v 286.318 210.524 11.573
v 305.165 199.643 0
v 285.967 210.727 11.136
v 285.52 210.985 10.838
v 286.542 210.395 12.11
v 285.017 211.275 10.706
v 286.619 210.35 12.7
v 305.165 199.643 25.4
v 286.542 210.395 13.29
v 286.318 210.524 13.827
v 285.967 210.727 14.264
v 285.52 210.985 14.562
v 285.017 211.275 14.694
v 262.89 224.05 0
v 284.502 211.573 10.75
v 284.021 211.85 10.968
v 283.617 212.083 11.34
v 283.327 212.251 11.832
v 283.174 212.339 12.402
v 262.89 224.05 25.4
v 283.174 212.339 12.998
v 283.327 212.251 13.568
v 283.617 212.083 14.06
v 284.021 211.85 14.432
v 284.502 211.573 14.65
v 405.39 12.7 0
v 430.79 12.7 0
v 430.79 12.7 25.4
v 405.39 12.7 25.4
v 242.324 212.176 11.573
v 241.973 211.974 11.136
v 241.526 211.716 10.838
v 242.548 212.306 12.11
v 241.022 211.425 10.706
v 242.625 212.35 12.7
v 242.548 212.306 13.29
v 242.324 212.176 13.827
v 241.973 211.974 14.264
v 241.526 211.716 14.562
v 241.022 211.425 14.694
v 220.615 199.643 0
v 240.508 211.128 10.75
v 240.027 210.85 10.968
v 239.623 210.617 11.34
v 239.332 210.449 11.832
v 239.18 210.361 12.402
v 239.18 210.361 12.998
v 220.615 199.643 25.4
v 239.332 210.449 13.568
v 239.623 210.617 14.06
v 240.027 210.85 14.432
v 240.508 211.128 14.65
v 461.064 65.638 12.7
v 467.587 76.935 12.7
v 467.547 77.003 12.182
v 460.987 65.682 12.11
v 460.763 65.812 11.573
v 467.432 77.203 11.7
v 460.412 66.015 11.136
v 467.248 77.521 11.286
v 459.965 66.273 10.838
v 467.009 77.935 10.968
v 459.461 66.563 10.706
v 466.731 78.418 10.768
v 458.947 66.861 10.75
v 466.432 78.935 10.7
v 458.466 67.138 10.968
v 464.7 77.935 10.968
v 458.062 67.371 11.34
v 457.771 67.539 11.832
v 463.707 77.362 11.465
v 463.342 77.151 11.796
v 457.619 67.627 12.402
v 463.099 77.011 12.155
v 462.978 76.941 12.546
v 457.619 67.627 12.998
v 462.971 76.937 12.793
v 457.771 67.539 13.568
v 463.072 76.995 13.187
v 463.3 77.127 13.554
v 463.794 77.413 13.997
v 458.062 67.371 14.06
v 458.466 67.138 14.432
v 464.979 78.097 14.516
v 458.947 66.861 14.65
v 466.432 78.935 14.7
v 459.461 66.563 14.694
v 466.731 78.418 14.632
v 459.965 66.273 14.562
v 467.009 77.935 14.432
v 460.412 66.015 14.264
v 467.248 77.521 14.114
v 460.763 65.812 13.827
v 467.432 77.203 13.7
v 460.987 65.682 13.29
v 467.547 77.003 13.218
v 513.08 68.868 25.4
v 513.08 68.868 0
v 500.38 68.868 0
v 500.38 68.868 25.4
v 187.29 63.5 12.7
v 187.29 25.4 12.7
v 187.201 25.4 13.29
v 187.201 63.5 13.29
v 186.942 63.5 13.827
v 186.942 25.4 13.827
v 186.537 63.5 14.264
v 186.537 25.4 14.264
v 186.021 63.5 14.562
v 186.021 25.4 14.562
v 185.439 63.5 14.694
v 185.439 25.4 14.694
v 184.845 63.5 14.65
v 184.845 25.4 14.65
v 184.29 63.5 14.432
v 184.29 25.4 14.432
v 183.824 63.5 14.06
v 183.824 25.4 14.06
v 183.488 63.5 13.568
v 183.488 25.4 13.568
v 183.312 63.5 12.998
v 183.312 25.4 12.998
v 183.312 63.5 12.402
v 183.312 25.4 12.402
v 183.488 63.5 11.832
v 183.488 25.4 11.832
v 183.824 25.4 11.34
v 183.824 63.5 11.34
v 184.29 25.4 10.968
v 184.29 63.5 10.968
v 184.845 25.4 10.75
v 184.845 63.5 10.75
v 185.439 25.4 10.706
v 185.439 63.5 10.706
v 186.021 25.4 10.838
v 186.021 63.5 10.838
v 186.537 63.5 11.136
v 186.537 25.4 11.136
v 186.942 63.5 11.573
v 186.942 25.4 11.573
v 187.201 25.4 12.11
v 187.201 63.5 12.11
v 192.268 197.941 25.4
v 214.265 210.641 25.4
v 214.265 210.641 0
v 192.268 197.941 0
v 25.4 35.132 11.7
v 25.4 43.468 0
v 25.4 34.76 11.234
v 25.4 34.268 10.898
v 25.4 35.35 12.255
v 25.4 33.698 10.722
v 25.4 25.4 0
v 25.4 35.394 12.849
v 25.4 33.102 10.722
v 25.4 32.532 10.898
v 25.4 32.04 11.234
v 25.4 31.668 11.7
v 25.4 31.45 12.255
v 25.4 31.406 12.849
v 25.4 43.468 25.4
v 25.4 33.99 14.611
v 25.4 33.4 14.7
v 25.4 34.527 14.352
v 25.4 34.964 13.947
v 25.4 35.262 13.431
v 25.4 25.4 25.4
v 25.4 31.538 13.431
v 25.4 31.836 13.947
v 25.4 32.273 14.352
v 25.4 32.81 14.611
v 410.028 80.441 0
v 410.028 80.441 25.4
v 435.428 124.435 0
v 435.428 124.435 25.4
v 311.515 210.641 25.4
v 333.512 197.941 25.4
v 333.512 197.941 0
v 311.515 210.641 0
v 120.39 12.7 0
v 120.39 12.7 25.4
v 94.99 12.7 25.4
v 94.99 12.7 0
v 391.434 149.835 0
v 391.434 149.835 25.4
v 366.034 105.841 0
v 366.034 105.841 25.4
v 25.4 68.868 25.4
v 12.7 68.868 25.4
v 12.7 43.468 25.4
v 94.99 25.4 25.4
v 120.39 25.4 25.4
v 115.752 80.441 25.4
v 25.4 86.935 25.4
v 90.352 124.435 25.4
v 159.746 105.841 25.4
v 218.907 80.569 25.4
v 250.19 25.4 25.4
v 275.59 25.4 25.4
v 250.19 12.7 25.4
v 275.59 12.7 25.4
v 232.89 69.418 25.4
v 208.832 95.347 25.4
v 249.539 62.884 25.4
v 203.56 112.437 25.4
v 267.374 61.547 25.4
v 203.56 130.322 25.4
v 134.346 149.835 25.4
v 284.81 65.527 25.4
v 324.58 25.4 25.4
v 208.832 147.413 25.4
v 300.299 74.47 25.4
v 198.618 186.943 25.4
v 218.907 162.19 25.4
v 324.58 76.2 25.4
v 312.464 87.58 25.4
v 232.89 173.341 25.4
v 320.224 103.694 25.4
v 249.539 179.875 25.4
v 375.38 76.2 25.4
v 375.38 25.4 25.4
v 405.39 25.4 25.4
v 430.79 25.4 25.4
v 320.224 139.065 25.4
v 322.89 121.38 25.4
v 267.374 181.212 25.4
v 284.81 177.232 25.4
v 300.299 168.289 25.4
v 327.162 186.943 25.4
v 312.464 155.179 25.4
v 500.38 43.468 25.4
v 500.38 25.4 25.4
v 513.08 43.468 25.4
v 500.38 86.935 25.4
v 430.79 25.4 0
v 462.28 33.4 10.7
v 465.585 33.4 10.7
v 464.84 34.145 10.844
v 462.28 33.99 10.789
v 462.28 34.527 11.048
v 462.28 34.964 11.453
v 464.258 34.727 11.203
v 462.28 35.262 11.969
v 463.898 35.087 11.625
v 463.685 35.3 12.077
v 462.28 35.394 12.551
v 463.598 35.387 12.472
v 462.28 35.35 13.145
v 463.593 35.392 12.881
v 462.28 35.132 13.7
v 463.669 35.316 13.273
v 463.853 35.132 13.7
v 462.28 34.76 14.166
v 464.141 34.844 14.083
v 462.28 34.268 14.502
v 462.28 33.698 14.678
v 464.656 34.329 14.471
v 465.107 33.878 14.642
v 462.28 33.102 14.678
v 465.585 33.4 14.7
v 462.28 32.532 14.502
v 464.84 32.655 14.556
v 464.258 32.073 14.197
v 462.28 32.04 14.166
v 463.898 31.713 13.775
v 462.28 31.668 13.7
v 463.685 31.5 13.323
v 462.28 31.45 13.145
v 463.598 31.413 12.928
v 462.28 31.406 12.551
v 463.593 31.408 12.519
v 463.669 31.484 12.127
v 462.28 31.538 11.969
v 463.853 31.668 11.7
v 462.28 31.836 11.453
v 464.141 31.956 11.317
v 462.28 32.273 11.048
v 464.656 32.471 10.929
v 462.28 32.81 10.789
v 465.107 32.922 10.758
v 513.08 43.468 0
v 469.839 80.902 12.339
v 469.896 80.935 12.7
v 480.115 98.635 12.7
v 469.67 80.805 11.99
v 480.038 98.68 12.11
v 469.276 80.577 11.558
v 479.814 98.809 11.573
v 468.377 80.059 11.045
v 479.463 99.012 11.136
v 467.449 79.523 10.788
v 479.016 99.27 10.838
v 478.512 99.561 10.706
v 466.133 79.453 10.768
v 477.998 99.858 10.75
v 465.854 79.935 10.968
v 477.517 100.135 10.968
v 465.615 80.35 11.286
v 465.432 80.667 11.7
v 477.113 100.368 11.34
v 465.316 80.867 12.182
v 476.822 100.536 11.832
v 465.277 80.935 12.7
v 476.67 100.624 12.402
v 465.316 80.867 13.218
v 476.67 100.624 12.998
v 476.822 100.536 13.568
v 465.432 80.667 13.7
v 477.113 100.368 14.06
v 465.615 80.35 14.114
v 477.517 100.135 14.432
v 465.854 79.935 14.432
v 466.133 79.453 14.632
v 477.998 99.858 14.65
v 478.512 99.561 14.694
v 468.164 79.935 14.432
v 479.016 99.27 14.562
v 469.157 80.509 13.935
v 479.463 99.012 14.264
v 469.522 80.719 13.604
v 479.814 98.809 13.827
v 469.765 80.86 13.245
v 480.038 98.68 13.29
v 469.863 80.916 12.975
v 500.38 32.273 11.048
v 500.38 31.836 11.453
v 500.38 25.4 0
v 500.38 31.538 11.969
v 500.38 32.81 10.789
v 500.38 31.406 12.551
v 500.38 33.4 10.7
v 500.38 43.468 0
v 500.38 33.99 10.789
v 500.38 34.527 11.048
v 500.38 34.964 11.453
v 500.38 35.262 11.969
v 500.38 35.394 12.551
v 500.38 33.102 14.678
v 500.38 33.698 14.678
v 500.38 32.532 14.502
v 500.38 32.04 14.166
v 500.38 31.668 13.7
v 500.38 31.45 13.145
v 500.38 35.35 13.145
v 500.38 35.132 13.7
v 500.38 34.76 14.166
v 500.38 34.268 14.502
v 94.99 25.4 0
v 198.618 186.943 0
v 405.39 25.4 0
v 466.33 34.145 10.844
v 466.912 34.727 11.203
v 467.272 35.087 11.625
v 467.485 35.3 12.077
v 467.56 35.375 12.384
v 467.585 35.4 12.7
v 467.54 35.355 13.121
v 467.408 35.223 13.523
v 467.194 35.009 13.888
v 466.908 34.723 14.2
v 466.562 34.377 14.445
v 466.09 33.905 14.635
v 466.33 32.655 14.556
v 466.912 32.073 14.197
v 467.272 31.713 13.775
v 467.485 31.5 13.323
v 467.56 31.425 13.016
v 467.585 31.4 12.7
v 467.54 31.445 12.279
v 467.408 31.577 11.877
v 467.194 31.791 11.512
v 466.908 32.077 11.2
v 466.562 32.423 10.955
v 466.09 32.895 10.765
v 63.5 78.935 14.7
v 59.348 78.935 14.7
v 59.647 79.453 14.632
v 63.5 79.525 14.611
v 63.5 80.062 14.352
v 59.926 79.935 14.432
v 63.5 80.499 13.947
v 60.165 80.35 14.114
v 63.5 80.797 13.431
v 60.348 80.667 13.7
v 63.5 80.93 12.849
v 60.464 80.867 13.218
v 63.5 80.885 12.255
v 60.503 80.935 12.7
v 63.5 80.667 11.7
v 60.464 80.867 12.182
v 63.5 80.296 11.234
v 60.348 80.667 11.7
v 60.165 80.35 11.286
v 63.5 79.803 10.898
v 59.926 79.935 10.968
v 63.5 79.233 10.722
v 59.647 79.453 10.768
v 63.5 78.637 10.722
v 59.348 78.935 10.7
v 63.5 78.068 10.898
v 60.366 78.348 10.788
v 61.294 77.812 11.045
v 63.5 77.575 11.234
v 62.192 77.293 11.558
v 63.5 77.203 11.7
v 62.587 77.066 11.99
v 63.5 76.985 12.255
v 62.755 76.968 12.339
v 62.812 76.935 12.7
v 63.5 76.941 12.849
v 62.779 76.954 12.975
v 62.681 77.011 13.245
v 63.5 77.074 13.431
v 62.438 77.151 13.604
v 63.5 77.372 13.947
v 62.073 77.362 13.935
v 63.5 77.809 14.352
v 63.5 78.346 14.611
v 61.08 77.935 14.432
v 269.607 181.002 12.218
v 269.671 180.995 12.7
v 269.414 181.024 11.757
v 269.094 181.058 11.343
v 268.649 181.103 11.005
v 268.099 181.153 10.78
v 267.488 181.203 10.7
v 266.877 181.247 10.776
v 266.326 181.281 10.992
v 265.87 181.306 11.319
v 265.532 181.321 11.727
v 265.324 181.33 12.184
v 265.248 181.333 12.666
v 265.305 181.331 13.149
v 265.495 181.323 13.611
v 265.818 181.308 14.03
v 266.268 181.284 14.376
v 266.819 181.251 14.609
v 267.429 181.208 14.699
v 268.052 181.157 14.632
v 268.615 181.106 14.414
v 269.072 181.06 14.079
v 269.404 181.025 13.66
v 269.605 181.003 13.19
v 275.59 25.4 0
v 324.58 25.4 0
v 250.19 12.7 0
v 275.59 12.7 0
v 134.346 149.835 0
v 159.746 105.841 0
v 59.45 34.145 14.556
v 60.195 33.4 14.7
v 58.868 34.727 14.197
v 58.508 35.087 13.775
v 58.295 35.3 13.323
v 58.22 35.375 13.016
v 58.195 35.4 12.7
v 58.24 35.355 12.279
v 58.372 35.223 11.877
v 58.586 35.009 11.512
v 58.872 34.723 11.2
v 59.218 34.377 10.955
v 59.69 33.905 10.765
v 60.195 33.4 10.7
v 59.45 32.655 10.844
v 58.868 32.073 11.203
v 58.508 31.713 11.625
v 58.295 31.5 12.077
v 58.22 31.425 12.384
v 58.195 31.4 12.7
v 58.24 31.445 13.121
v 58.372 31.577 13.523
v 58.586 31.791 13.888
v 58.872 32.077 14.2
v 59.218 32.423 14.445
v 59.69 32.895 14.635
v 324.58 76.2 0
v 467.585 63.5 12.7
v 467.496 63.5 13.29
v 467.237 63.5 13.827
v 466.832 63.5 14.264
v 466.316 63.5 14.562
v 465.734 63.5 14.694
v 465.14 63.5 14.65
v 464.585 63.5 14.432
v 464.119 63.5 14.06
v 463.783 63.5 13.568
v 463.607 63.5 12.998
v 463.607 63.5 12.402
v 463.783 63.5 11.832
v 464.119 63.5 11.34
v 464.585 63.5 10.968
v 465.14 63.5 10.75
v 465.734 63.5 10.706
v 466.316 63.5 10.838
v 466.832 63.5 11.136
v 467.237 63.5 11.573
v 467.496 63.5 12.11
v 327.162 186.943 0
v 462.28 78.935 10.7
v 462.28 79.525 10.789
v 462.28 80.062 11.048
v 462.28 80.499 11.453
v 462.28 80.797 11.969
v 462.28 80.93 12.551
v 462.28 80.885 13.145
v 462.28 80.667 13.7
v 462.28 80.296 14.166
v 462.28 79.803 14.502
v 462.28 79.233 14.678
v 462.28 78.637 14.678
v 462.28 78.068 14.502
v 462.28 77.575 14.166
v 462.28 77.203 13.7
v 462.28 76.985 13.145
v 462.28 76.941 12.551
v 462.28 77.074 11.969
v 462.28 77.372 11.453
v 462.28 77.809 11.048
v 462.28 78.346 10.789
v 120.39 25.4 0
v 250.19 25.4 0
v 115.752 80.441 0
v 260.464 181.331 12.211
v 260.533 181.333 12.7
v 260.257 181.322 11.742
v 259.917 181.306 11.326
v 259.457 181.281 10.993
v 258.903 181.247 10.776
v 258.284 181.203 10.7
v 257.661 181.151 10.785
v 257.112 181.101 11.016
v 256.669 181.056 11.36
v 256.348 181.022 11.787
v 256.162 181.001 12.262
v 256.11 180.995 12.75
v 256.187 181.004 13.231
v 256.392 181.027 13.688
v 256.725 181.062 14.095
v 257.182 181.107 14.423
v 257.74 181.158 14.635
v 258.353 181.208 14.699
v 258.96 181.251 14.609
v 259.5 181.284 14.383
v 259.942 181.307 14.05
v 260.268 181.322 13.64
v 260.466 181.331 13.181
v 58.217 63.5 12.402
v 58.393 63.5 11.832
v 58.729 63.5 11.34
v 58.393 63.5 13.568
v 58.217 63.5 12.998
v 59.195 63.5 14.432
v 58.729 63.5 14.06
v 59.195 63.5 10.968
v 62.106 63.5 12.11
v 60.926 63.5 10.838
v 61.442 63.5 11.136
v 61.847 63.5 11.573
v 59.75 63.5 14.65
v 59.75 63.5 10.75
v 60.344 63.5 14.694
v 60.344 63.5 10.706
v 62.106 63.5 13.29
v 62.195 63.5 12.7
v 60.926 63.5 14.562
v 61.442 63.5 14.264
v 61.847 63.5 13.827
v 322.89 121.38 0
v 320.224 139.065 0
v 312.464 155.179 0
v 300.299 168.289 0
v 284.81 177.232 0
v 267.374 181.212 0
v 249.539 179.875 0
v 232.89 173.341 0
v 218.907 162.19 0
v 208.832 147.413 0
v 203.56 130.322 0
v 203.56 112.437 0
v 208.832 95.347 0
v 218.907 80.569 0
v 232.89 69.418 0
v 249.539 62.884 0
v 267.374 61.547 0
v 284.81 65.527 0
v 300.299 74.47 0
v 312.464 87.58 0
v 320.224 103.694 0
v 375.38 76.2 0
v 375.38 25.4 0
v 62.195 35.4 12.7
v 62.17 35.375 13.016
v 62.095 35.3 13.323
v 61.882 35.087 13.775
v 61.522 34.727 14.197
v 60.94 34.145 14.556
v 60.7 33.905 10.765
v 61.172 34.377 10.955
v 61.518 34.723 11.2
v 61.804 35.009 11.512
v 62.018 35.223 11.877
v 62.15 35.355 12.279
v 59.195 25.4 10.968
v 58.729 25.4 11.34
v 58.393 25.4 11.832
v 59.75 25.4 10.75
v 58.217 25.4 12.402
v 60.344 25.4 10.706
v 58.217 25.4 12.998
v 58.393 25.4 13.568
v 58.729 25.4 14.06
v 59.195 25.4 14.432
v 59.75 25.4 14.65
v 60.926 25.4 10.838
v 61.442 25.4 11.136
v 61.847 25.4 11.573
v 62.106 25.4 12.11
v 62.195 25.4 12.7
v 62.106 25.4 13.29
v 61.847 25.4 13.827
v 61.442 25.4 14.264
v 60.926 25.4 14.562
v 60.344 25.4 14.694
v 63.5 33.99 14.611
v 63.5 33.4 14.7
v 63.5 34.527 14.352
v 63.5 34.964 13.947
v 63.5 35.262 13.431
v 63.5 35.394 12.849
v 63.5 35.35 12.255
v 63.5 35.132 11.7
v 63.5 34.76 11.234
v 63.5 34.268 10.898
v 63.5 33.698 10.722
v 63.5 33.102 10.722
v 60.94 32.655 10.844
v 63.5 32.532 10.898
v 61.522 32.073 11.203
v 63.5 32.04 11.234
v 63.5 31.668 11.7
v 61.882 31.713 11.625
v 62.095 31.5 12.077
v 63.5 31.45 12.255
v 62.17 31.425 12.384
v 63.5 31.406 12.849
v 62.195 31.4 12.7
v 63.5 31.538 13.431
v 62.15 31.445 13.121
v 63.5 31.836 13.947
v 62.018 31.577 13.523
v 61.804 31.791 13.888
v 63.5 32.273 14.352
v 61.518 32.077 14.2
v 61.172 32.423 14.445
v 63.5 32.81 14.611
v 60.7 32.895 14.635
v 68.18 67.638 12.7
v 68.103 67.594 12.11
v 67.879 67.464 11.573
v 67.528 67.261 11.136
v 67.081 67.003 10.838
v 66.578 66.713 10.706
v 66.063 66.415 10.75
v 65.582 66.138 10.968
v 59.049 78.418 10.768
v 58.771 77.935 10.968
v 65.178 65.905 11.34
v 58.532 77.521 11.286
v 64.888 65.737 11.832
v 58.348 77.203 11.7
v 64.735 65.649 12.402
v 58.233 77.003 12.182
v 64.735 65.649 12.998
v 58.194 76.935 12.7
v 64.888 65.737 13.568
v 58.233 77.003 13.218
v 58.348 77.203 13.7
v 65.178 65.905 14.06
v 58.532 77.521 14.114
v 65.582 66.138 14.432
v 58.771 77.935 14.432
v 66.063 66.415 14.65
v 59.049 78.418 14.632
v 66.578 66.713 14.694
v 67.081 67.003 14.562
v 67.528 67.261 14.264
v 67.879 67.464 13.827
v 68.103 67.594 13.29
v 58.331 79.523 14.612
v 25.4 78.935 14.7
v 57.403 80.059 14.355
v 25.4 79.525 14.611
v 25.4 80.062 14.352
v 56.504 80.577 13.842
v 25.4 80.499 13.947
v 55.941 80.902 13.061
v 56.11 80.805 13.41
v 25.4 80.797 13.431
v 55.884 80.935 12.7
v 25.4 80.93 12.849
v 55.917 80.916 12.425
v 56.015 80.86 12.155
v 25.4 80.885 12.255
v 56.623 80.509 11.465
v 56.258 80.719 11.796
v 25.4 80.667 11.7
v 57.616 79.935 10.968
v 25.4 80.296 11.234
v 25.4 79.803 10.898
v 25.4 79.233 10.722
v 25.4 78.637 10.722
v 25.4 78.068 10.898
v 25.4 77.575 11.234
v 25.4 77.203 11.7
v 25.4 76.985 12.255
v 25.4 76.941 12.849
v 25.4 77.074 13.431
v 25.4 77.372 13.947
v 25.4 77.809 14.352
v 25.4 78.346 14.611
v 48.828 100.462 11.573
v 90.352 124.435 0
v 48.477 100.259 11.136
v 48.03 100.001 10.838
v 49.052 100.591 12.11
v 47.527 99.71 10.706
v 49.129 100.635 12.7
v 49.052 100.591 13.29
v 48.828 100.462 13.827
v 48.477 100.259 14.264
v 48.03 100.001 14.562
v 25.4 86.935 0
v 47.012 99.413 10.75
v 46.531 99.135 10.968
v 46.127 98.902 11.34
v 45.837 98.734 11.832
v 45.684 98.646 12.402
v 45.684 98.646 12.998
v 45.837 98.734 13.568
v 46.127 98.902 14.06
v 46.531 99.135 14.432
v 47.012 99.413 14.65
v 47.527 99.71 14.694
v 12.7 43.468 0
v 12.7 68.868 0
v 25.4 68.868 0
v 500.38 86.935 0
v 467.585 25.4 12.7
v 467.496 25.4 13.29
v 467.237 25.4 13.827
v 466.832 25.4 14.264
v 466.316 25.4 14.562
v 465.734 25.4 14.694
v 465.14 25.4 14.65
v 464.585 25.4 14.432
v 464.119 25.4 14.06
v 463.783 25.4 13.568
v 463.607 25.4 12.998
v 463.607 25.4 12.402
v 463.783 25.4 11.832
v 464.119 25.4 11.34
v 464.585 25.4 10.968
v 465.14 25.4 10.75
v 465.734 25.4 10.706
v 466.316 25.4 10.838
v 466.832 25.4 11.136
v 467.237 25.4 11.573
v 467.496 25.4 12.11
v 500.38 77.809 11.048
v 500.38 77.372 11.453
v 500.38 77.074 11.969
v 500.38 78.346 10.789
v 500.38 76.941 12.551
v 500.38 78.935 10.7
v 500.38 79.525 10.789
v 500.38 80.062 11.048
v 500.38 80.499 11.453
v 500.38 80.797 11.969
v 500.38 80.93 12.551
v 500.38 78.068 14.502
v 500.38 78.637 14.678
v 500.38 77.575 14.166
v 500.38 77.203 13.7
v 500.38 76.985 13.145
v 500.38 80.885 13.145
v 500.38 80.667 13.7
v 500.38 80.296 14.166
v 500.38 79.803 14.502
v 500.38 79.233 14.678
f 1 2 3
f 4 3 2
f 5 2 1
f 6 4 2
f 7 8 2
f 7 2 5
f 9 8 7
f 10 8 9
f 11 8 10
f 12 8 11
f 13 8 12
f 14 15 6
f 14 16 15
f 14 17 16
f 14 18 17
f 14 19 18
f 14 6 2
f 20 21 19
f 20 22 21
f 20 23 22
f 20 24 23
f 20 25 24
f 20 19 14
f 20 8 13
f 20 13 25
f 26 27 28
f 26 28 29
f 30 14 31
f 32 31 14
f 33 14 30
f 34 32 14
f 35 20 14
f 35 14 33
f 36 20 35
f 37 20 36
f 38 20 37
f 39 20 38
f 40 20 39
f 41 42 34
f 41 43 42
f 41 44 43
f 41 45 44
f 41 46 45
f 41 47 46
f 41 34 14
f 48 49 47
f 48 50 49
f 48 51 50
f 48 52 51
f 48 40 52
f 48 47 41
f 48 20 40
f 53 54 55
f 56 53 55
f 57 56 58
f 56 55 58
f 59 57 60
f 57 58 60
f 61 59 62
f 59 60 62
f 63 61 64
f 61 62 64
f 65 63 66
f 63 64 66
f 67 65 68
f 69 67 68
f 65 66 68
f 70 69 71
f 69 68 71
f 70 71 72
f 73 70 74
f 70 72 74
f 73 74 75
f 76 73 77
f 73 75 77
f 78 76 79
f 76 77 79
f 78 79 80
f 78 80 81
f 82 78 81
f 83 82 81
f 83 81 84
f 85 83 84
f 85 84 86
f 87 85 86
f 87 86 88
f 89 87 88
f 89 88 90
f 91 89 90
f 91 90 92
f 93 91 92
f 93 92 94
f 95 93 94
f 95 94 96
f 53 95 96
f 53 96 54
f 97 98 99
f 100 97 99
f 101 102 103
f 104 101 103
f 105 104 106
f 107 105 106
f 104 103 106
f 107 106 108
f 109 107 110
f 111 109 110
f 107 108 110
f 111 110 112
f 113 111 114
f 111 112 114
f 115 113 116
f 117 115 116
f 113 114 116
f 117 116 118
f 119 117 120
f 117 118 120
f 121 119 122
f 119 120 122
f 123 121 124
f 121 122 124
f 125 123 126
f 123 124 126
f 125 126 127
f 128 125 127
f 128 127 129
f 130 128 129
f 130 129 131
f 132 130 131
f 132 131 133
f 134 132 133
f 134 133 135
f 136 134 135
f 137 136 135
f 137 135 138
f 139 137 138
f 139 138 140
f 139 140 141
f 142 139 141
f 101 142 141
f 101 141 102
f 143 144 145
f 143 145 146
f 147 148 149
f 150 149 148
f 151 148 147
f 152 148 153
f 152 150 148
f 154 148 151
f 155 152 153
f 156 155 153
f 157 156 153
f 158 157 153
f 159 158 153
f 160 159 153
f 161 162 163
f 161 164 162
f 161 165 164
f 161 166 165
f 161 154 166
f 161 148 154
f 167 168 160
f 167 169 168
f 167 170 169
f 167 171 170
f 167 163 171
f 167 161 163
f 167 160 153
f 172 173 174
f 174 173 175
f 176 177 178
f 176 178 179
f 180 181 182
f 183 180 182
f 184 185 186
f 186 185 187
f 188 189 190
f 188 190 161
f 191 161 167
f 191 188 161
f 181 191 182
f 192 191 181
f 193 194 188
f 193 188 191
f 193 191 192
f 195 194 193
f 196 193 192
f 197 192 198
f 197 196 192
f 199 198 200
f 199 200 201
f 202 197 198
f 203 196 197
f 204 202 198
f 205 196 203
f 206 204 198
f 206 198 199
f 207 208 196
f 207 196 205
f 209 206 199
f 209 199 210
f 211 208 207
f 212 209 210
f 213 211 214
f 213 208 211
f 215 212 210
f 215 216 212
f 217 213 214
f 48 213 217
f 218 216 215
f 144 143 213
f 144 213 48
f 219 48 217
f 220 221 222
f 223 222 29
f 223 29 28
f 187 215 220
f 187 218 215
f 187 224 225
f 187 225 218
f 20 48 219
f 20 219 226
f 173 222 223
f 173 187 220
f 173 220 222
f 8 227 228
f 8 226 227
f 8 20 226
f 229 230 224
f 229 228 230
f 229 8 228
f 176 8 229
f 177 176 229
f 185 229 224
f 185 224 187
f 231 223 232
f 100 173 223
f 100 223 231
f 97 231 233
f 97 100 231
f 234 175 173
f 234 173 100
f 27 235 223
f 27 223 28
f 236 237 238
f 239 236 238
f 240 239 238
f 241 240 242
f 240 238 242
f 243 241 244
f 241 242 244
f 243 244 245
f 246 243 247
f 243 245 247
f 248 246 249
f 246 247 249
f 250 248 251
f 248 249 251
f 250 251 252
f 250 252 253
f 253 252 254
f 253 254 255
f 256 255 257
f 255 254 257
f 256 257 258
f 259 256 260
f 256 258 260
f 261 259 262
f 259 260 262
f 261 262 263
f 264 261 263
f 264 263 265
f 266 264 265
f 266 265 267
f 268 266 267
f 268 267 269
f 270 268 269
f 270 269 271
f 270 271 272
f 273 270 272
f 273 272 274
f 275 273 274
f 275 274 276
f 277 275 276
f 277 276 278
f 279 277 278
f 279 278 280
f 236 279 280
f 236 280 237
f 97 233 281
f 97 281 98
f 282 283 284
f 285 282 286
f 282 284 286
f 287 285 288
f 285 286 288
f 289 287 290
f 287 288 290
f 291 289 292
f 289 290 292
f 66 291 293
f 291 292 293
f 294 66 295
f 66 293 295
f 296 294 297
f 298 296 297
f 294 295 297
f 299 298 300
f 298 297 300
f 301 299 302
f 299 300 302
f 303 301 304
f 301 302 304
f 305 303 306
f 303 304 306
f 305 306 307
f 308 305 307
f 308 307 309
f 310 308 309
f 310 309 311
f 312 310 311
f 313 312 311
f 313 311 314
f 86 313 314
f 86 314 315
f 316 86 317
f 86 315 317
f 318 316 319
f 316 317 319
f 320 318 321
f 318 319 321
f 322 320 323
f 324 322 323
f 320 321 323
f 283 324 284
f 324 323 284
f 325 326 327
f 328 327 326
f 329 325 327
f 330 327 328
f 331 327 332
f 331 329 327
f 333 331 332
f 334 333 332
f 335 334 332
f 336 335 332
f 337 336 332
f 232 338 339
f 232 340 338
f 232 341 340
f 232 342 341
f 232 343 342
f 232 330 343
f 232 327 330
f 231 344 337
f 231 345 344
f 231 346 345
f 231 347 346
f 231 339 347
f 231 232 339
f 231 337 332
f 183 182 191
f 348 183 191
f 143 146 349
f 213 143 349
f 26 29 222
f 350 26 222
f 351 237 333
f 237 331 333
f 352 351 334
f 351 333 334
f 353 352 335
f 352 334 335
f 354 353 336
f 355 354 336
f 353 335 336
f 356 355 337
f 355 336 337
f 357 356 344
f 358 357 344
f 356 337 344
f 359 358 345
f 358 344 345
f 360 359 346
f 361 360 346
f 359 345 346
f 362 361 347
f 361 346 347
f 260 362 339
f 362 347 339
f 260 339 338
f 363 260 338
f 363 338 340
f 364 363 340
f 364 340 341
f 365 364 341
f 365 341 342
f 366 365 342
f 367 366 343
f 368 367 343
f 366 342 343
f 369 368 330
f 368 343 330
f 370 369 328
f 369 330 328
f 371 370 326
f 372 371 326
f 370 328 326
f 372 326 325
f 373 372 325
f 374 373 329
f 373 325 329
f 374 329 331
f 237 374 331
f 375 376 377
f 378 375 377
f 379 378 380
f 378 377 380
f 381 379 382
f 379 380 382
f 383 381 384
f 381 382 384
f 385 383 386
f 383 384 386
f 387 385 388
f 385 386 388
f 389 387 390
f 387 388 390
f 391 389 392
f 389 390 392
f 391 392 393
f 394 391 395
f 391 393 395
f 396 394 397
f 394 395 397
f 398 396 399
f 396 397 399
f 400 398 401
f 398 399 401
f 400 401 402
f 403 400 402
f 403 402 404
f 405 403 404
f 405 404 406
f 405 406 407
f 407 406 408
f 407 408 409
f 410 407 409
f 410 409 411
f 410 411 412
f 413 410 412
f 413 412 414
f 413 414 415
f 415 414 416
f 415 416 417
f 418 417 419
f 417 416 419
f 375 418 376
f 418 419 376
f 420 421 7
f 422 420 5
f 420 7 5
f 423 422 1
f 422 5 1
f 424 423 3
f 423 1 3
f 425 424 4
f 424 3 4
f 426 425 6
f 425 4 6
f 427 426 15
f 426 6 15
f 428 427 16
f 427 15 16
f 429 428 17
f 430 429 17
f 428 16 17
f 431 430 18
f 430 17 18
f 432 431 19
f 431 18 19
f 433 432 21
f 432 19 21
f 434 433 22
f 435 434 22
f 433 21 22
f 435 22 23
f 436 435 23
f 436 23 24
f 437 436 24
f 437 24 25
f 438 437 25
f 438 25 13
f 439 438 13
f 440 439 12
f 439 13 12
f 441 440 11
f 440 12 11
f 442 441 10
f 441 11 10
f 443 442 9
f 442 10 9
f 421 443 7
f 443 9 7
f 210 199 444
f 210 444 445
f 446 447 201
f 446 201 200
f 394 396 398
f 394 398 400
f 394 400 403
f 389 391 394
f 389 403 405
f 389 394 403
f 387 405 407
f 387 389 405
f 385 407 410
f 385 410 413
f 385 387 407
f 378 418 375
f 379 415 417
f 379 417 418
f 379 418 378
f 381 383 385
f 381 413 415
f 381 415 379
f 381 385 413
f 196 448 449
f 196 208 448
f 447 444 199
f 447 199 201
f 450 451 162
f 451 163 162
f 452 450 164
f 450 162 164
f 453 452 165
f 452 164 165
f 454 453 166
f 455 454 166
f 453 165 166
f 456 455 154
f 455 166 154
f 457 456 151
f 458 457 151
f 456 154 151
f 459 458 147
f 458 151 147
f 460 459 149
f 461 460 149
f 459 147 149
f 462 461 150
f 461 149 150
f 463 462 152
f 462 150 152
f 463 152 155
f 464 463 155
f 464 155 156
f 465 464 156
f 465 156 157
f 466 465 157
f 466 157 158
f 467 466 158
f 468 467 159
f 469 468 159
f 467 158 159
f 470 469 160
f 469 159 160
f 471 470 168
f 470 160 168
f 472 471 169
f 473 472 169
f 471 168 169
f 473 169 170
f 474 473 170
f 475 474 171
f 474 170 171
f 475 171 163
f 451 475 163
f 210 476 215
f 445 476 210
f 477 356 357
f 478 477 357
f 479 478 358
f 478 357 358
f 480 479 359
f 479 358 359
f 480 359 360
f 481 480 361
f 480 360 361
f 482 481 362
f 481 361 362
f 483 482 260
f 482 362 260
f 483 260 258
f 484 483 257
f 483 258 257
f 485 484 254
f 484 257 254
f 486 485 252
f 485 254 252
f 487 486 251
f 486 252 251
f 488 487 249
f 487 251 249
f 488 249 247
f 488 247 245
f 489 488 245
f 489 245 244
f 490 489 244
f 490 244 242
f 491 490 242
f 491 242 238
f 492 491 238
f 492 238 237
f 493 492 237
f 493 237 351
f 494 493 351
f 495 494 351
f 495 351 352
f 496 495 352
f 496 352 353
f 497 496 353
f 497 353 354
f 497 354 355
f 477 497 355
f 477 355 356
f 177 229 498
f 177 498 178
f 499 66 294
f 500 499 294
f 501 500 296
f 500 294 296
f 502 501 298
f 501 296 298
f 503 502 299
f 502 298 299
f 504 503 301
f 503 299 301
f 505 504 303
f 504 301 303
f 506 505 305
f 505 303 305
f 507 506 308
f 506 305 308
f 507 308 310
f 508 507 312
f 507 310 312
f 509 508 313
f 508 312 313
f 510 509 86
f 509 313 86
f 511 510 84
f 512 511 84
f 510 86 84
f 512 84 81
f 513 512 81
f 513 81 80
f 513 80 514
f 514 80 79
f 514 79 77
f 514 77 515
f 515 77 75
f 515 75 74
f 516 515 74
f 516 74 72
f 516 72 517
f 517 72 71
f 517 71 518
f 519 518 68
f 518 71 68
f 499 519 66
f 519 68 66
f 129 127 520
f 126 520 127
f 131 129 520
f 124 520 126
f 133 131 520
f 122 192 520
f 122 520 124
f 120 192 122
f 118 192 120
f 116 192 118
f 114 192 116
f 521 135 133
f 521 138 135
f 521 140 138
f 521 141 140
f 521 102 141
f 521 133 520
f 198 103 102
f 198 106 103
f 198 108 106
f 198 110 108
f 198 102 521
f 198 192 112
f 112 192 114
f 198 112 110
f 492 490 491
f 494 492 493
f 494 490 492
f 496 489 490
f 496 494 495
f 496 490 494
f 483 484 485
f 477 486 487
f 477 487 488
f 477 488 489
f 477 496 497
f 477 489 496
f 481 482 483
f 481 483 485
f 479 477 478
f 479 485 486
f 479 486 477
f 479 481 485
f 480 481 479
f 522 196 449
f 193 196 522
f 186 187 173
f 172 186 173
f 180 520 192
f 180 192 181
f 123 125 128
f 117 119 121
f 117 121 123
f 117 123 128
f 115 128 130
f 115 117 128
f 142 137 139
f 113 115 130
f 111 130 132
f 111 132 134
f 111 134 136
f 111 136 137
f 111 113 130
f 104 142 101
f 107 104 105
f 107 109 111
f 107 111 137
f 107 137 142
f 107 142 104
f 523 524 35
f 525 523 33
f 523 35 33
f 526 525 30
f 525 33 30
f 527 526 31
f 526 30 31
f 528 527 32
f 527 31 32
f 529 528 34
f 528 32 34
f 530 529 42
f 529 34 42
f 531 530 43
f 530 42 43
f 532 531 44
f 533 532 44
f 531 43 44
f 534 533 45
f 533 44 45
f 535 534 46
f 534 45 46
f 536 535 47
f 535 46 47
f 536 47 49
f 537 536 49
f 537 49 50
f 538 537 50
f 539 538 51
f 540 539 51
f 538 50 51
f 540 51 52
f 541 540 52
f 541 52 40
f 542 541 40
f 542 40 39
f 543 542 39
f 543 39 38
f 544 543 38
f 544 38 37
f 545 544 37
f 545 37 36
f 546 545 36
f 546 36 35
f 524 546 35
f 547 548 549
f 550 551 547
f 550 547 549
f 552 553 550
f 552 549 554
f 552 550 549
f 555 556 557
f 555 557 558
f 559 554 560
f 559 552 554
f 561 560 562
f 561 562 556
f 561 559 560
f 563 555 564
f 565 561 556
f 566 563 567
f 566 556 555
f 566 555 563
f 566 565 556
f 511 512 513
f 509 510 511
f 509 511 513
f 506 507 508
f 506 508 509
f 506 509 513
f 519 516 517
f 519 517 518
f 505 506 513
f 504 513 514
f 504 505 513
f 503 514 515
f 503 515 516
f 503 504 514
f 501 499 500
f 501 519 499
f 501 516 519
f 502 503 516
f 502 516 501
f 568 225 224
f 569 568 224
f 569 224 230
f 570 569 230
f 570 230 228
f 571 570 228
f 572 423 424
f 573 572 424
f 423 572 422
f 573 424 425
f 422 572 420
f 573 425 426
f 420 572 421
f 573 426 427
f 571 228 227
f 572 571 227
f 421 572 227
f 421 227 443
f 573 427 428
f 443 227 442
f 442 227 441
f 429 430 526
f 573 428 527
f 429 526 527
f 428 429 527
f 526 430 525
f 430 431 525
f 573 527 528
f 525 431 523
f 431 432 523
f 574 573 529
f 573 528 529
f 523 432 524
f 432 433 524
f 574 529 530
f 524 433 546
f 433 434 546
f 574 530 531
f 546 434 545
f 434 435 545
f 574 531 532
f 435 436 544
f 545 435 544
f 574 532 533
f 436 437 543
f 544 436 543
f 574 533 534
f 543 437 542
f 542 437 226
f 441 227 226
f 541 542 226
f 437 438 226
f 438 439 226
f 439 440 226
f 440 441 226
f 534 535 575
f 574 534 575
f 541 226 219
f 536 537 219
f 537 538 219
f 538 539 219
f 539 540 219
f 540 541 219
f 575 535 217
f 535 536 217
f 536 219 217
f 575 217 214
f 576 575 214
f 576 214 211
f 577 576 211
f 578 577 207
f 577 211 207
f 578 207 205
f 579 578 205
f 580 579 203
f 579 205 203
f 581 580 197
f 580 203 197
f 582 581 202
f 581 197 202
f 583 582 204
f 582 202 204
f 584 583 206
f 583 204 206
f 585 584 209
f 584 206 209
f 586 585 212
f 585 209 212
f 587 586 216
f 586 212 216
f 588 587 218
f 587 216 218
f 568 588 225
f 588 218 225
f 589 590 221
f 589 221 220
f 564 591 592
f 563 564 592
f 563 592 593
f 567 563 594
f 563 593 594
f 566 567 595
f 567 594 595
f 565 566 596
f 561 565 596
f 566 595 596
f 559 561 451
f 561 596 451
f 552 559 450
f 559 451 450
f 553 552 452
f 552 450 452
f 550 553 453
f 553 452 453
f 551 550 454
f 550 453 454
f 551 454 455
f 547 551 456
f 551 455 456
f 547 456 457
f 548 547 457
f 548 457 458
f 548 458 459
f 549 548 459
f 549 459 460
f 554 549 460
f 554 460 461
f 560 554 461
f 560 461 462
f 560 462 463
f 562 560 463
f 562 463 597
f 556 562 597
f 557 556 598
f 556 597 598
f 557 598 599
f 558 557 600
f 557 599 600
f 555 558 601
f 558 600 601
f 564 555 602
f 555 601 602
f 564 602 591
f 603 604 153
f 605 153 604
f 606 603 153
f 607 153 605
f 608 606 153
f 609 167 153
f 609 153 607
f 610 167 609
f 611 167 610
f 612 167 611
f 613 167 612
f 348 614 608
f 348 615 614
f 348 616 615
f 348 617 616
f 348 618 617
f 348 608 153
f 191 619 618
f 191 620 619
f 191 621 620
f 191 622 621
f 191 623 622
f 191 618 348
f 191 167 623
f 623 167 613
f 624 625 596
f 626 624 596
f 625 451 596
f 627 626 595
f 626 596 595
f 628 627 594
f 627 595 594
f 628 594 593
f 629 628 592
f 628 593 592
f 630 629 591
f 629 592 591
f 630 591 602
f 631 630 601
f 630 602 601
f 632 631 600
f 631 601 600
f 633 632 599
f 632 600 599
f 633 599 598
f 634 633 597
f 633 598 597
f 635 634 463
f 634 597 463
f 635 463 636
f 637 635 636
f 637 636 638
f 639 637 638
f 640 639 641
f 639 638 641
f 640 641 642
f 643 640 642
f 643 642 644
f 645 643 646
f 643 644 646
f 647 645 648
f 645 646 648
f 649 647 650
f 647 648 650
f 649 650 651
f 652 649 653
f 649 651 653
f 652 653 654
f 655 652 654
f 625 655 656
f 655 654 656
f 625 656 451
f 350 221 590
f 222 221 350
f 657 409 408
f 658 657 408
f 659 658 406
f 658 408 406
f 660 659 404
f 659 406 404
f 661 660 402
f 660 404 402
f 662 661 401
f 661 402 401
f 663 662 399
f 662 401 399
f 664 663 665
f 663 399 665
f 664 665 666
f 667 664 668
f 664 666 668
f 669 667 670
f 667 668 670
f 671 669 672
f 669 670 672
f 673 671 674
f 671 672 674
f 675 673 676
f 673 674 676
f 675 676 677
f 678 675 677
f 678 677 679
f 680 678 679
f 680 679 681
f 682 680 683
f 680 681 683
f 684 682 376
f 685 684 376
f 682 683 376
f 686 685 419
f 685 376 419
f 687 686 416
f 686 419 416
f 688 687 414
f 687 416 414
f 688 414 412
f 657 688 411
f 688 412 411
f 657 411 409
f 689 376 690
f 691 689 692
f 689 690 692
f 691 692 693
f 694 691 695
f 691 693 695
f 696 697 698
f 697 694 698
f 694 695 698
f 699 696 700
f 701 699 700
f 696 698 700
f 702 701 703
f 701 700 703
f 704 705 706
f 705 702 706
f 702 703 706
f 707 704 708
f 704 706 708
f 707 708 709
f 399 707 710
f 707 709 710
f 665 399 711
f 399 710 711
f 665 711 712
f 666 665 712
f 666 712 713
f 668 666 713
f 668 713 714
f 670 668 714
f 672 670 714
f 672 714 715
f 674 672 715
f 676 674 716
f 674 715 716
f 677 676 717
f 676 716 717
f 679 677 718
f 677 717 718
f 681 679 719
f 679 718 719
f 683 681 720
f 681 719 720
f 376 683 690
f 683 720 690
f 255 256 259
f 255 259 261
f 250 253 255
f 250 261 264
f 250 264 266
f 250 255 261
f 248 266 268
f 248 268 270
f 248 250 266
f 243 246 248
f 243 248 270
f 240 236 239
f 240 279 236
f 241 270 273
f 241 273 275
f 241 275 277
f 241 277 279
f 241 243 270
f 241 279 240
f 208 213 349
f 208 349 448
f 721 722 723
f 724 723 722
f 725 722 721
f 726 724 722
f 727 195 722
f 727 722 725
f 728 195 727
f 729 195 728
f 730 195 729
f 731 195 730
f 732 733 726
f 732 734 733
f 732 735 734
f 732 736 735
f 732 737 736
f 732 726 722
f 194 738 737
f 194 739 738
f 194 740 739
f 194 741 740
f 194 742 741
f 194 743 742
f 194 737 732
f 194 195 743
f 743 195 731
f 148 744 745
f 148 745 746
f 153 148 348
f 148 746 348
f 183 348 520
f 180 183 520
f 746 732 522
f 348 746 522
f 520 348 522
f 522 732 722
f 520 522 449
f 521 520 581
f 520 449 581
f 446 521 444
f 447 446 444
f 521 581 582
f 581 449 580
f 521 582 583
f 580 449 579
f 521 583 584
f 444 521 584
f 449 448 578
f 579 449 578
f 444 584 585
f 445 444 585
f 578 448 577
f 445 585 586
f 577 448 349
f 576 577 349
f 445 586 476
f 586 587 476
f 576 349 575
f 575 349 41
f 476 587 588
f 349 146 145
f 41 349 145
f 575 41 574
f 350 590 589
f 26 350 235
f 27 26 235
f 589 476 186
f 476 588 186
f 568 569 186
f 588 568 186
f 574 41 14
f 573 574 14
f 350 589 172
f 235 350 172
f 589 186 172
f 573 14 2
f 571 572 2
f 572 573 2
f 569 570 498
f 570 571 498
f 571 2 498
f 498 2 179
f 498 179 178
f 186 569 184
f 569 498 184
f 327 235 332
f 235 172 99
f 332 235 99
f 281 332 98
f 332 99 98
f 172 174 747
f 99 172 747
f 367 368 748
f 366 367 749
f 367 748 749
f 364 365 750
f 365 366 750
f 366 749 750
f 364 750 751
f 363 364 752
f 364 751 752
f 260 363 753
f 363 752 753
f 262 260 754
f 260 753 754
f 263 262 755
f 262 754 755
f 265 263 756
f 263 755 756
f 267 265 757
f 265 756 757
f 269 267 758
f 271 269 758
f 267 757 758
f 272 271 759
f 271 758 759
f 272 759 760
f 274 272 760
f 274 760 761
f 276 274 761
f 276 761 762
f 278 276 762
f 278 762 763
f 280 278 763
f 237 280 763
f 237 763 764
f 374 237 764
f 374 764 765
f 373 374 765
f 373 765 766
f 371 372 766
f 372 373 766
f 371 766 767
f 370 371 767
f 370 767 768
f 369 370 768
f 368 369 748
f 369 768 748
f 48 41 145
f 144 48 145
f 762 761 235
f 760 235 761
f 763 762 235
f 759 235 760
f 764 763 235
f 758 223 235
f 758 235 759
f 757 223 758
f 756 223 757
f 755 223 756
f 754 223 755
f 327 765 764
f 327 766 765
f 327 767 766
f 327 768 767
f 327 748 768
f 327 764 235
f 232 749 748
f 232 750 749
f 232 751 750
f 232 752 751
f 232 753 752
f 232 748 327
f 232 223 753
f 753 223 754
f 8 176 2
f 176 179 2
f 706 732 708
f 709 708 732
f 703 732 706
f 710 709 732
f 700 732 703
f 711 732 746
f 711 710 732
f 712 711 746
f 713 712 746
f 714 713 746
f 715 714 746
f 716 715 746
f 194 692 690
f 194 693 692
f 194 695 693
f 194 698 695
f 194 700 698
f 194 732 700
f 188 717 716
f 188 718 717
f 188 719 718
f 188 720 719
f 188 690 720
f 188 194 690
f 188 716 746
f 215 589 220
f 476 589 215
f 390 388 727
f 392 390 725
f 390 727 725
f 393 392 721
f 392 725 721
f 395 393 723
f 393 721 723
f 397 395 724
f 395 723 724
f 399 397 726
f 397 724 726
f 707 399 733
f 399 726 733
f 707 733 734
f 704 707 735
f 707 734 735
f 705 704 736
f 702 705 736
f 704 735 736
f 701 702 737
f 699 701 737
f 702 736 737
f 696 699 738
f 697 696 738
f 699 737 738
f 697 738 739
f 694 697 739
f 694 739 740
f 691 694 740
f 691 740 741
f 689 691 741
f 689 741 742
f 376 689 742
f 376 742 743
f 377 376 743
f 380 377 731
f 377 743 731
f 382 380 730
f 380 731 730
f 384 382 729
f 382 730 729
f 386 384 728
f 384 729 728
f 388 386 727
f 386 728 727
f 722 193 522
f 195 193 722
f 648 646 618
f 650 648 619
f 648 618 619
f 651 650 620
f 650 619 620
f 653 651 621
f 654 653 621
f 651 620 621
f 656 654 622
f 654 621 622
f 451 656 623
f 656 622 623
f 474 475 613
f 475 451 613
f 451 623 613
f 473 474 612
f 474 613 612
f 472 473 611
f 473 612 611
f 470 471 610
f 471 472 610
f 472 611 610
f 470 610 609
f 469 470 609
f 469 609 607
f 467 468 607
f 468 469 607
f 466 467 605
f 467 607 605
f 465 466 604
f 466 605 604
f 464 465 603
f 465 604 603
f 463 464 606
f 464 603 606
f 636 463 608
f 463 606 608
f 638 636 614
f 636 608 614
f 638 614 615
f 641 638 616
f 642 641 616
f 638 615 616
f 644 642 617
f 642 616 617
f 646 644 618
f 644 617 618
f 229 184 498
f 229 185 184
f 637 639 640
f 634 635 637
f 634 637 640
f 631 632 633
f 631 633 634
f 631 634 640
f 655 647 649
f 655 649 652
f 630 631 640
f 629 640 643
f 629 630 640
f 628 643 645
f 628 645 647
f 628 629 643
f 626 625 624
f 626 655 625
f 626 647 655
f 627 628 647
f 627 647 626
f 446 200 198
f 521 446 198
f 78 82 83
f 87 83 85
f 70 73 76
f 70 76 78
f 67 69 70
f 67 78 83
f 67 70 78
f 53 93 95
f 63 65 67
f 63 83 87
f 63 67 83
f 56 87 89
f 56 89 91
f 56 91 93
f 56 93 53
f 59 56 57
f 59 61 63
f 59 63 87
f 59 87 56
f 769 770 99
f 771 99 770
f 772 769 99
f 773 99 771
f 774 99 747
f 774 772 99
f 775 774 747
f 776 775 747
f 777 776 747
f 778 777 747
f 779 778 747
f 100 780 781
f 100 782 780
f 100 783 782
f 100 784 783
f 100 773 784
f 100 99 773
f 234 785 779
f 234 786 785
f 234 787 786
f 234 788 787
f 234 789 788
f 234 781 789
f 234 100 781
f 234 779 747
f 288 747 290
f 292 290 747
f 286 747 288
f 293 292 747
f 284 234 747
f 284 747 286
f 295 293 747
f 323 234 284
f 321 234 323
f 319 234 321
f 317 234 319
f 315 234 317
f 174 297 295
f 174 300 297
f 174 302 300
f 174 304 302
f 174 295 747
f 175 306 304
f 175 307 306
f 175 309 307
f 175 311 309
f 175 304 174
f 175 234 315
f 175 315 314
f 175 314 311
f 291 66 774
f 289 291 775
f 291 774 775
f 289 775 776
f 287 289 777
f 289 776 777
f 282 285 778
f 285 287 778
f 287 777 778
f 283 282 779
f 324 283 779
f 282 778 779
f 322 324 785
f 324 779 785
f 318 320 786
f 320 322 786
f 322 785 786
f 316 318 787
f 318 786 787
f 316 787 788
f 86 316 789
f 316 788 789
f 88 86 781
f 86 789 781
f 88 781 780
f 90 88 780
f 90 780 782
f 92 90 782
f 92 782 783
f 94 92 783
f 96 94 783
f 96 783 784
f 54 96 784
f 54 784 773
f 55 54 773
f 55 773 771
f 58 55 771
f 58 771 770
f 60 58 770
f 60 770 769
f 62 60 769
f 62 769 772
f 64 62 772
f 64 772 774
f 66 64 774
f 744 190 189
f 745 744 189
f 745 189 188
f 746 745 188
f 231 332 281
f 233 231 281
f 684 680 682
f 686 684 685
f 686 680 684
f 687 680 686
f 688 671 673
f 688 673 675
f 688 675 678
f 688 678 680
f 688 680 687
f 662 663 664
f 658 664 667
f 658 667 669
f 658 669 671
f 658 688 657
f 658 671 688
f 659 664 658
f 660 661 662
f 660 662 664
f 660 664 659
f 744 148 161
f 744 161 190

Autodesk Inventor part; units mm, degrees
ref_plane "YZ Plane" through (0, 0, 0) normal (1, 0, 0) x (0, 1, 0)
ref_plane "XZ Plane" through (0, 0, 0) normal (0, 1, 0) x (-1, 0, 0)
ref_plane "XY Plane" through (0, 0, 0) normal (0, 0, 1) x (1, 0, 0)
sketch "Sketch1" plane through (0, 0, 0) normal (0, 0, 1) x (1, 0, 0)
  line L0 (262.89, 253.3796) -> (525.78, 101.6)
  line L1 (525.78, 101.6) -> (525.78, -201.9592) construction
  line L2 (525.78, -201.9592) -> (262.89, -353.7388) construction
  line L3 (262.89, -353.7388) -> (0, -201.9592) construction
  line L4 (0, -201.9592) -> (0, 101.6) construction
  line L5 (0, 101.6) -> (262.89, 253.3796)
  line L6 (0, 101.6) -> (0, 0)
  line L7 (0, 0) -> (525.78, 0)
  line L8 (525.78, 0) -> (525.78, 101.6)
  point P0 (262.89, -50.1796)
  dimension "d0" = 525.78
  dimension "d1" = 101.6
extrude "Extrusion1" add sketch "Sketch1" along normal blind 25.4
sketch "Sketch2" plane through (0, 0, 25.4) normal (0, 0, 1) x (1, 0, 0)
  circle A0 centre (262.89, 121.3796) radius 60
  line L0 (0, 0) -> (525.78, 0) projected
  point P0 (262.89, 0)
  dimension "d4" = 121.3796
  dimension "d5" = 120
extrude "Extrusion2" cut sketch "Sketch2" against normal through all
sketch "Sketch3" plane through (0, 0, 25.4) normal (0, 0, 1) x (1, 0, 0)
  circle A0 centre (262.89, 121.3796) radius 60 projected
  line L0 (0, 101.6) -> (0, 0) projected
  line L1 (0, 0) -> (525.78, 0) projected
  line L2 (525.78, 0) -> (525.78, 101.6) projected
  line L3 (525.78, 101.6) -> (262.89, 253.3796) projected
  line L4 (262.89, 253.3796) -> (0, 101.6) projected
  line L5 (25.4, 86.9353) -> (25.4, 25.4)
  line L6 (25.4, 25.4) -> (500.38, 25.4)
  line L7 (500.38, 25.4) -> (500.38, 86.9353)
  line L8 (500.38, 86.9353) -> (262.89, 224.0502)
  line L9 (262.89, 224.0502) -> (25.4, 86.9353)
  dimension "d8" = 25.4
extrude "Extrusion3" cut sketch "Sketch3" against normal through all contours L4 L3 L2 L1 L0
sketch "Sketch4" plane through (0, 0, 25.4) normal (0, 0, 1) x (1, 0, 0)
  line L0 (134.346, 149.8353) -> (159.746, 105.8412)
  line L1 (159.746, 105.8412) -> (115.7519, 80.4412)
  line L2 (115.7519, 80.4412) -> (90.3519, 124.4353)
  line L3 (90.3519, 124.4353) -> (134.346, 149.8353)
  line L4 (134.346, 149.8353) -> (115.7519, 80.4412) construction
  line L5 (159.746, 105.8412) -> (90.3519, 124.4353) construction
  line L6 (262.89, 224.0502) -> (25.4, 86.9353) projected
  line L7 (500.38, 86.9353) -> (262.89, 224.0502) projected
  line L8 (262.89, 224.0502) -> (262.89, 25.4)
  line L9 (25.4, 25.4) -> (500.38, 25.4) projected
  line L10 (391.434, 149.8353) -> (366.034, 105.8412)
  line L11 (366.034, 105.8412) -> (410.0281, 80.4412)
  line L12 (410.0281, 80.4412) -> (435.4281, 124.4353)
  line L13 (435.4281, 124.4353) -> (391.434, 149.8353)
  line L14 (391.434, 149.8353) -> (410.0281, 80.4412) construction
  line L15 (366.034, 105.8412) -> (435.4281, 124.4353) construction
  point P0 (0, 0)
  point P1 (125.049, 115.1383)
  point P2 (400.731, 115.1383)
  point P3 (381.635, 155.4928)
  dimension "d11" = 50.8
  dimension "d12" = 50.8
  dimension "d15" = 75
extrude "Extrusion4" cut sketch "Sketch4" against normal through all
sketch "Sketch5" plane through (0, 0, 0) normal (0, 0, -1) x (-1, 0, 0)
  line L0 (-25.4, 86.9353) -> (-25.4, 25.4) projected
  line L1 (-25.4, 43.4677) -> (-12.7, 43.4677)
  line L2 (-12.7, 43.4677) -> (-12.7, 68.8677)
  line L3 (-12.7, 68.8677) -> (-25.4, 68.8677)
  line L4 (-25.4, 68.8677) -> (-25.4, 43.4677)
  line L5 (-25.4, 25.4) -> (-500.38, 25.4) projected
  line L6 (-94.99, 25.4) -> (-120.39, 25.4)
  line L7 (-120.39, 25.4) -> (-120.39, 12.7)
  line L8 (-120.39, 12.7) -> (-94.99, 12.7)
  line L9 (-94.99, 12.7) -> (-94.99, 25.4)
  line L10 (-405.39, 25.4) -> (-430.79, 25.4)
  line L11 (-430.79, 25.4) -> (-430.79, 12.7)
  line L12 (-430.79, 12.7) -> (-405.39, 12.7)
  line L13 (-405.39, 12.7) -> (-405.39, 25.4)
  line L14 (-500.38, 25.4) -> (-500.38, 86.9353) projected
  line L15 (-500.38, 43.4677) -> (-513.08, 43.4677)
  line L16 (-513.08, 43.4677) -> (-513.08, 68.8677)
  line L17 (-513.08, 68.8677) -> (-500.38, 68.8677)
  line L18 (-500.38, 68.8677) -> (-500.38, 43.4677)
  line L19 (-262.89, 224.0502) -> (-134.346, 149.8353) projected
  line L20 (-198.618, 186.9428) -> (-220.615, 199.6428)
  line L21 (-220.615, 199.6428) -> (-214.265, 210.6413)
  line L22 (-214.265, 210.6413) -> (-192.268, 197.9413)
  line L23 (-192.268, 197.9413) -> (-198.618, 186.9428)
  line L24 (-391.434, 149.8353) -> (-262.89, 224.0502) projected
  line L25 (-305.165, 199.6428) -> (-327.162, 186.9428)
  line L26 (-327.162, 186.9428) -> (-333.512, 197.9413)
  line L27 (-333.512, 197.9413) -> (-311.515, 210.6413)
  line L28 (-311.515, 210.6413) -> (-305.165, 199.6428)
  line L29 (-262.89, 224.0502) -> (-391.434, 149.8353) projected
  line L30 (-120.39, 19.05) -> (-405.39, 19.05) construction
  line L31 (-250.19, 25.4) -> (-275.59, 25.4)
  line L32 (-275.59, 25.4) -> (-275.59, 12.7)
  line L33 (-275.59, 12.7) -> (-250.19, 12.7)
  line L34 (-250.19, 12.7) -> (-250.19, 25.4)
  line L35 (-500.38, 25.4) -> (-25.4, 25.4) projected
  line L36 (-305.165, 199.6428) -> (-311.515, 210.6413)
  line L37 (-311.515, 210.6413) -> (-333.512, 197.9413)
  line L38 (-333.512, 197.9413) -> (-327.162, 186.9428)
  line L39 (-327.162, 186.9428) -> (-305.165, 199.6428)
  point P0 (0, 0)
  point P1 (-25.4, 56.1677)
  point P2 (-262.89, 25.4)
  point P3 (-262.89, 19.05)
  point P4 (-262.89, 25.4)
  dimension "d16" = 12.7
  dimension "d17" = 12.7
  dimension "d18" = 12.7
  dimension "d19" = 12.7
  dimension "d20" = 12.7
  dimension "d21" = 12.7
  dimension "d22" = 25.4
  dimension "d23" = 25.4
  dimension "d24" = 25.4
  dimension "d25" = 25.4
  dimension "d26" = 25.4
  dimension "d27" = 25.4
  dimension "d28" = 285
  dimension "d29" = 25.4
  dimension "d30" = 12.7
extrude "Extrusion5" add sketch "Sketch5" against normal blind 25.4
sketch "Sketch6" plane through (0, 0, 0) normal (0, 0, -1) x (-1, 0, 0)
  line L0 (-275.59, 25.4) -> (-405.39, 25.4) projected
  line L1 (-324.58, 25.4) -> (-375.38, 25.4)
  line L2 (-375.38, 25.4) -> (-375.38, 76.2)
  line L3 (-375.38, 76.2) -> (-324.58, 76.2)
  line L4 (-324.58, 76.2) -> (-324.58, 25.4)
  line L5 (-500.38, 43.4677) -> (-500.38, 25.4) projected
  point P0 (0, 0)
  dimension "d33" = 50.8
  dimension "d34" = 50.8
  dimension "d35" = 125
extrude "Extrusion6" cut sketch "Sketch6" against normal through all
sketch "Sketch8" plane through (500.38, 86.9353, 25.4) normal (0.5, 0.866, 0) x (0.866, -0.5, 0)
  circle A0 centre (-248.8298, 12.7) radius 2
  circle A1 centre (-25.4, 12.7) radius 2
  line L0 (0, 0) -> (0, 25.4) projected
  line L1 (-274.2298, 0) -> (-274.2298, 25.4) projected
  point P0 (-389.8741, 25.4)
  point P1 (0, 12.7)
  dimension "d44" = 4
  dimension "d45" = 4
  dimension "d46" = 25.4
  dimension "d47" = 25.4
extrude "Extrusion8" cut sketch "Sketch8" against normal blind 38.1
sketch "Sketch9" plane through (262.89, 224.0502, 25.4) normal (-0.5, 0.866, 0) x (0.866, 0.5, 0)
  line L0 (0, 0) -> (0, 25.4) projected
  line L1 (-274.2298, 0) -> (-274.2298, 25.4) projected
  circle A0 centre (-25.4, 12.7) radius 2
  circle A1 centre (-248.8298, 12.7) radius 2
  point P0 (-339.6945, 25.4)
  point P1 (-274.2298, 12.7)
  dimension "d50" = 4
  dimension "d51" = 4
  dimension "d52" = 25.4
  dimension "d53" = 25.4
extrude "Extrusion9" cut sketch "Sketch9" against normal blind 38.1
sketch "Sketch10" plane through (500.38, 25.4, 25.4) normal (1, 0, 0) x (0, 0, -1)
  line L0 (0, 0) -> (25.4, 0) projected
  line L1 (0, 61.5353) -> (25.4, 61.5353) projected
  circle A0 centre (12.7, 8) radius 2
  circle A1 centre (12.7, 53.5353) radius 2
  point P0 (25.4, -25.4)
  point P1 (12.7, 0)
  point P2 (12.7, 61.5353)
  dimension "d56" = 4
  dimension "d57" = 4
  dimension "d58" = 8
  dimension "d59" = 8
extrude "Extrusion10" cut sketch "Sketch10" against normal blind 38.1
sketch "Sketch11" plane through (25.4, 86.9353, 0) normal (-1, 0, 0) x (0, 0, 1)
  circle A0 centre (12.7, -8) radius 2 projected
  circle A1 centre (12.7, -53.5353) radius 2 projected
  point P0 (0, -86.9353)
extrude "Extrusion11" cut sketch "Sketch11" against normal blind 38.1
sketch "Sketch12" plane through (120.39, 25.4, 25.4) normal (0, -1, 0) x (1, 0, 0)
  circle A0 centre (-60.195, -12.7) radius 2
  circle A1 centre (64.9, -12.7) radius 2
  circle A2 centre (345.195, -12.7) radius 2
  line L0 (310.4, 0) -> (379.99, 0) projected
  line L1 (0, 0) -> (129.8, 0) projected
  line L2 (-94.99, 0) -> (-25.4, 0) projected
  line L3 (379.99, 0) -> (379.99, -25.4) projected
  point P0 (-120.39, -25.4)
  point P1 (345.195, 0)
  point P2 (64.9, 0)
  point P3 (-60.195, 0)
  point P4 (379.99, -12.7)
  dimension "d64" = 4
  dimension "d65" = 4
  dimension "d66" = 4
extrude "Extrusion12" cut sketch "Sketch12" against normal blind 38.1
properties part number "HB04" material "Polyethylene, High Density"
